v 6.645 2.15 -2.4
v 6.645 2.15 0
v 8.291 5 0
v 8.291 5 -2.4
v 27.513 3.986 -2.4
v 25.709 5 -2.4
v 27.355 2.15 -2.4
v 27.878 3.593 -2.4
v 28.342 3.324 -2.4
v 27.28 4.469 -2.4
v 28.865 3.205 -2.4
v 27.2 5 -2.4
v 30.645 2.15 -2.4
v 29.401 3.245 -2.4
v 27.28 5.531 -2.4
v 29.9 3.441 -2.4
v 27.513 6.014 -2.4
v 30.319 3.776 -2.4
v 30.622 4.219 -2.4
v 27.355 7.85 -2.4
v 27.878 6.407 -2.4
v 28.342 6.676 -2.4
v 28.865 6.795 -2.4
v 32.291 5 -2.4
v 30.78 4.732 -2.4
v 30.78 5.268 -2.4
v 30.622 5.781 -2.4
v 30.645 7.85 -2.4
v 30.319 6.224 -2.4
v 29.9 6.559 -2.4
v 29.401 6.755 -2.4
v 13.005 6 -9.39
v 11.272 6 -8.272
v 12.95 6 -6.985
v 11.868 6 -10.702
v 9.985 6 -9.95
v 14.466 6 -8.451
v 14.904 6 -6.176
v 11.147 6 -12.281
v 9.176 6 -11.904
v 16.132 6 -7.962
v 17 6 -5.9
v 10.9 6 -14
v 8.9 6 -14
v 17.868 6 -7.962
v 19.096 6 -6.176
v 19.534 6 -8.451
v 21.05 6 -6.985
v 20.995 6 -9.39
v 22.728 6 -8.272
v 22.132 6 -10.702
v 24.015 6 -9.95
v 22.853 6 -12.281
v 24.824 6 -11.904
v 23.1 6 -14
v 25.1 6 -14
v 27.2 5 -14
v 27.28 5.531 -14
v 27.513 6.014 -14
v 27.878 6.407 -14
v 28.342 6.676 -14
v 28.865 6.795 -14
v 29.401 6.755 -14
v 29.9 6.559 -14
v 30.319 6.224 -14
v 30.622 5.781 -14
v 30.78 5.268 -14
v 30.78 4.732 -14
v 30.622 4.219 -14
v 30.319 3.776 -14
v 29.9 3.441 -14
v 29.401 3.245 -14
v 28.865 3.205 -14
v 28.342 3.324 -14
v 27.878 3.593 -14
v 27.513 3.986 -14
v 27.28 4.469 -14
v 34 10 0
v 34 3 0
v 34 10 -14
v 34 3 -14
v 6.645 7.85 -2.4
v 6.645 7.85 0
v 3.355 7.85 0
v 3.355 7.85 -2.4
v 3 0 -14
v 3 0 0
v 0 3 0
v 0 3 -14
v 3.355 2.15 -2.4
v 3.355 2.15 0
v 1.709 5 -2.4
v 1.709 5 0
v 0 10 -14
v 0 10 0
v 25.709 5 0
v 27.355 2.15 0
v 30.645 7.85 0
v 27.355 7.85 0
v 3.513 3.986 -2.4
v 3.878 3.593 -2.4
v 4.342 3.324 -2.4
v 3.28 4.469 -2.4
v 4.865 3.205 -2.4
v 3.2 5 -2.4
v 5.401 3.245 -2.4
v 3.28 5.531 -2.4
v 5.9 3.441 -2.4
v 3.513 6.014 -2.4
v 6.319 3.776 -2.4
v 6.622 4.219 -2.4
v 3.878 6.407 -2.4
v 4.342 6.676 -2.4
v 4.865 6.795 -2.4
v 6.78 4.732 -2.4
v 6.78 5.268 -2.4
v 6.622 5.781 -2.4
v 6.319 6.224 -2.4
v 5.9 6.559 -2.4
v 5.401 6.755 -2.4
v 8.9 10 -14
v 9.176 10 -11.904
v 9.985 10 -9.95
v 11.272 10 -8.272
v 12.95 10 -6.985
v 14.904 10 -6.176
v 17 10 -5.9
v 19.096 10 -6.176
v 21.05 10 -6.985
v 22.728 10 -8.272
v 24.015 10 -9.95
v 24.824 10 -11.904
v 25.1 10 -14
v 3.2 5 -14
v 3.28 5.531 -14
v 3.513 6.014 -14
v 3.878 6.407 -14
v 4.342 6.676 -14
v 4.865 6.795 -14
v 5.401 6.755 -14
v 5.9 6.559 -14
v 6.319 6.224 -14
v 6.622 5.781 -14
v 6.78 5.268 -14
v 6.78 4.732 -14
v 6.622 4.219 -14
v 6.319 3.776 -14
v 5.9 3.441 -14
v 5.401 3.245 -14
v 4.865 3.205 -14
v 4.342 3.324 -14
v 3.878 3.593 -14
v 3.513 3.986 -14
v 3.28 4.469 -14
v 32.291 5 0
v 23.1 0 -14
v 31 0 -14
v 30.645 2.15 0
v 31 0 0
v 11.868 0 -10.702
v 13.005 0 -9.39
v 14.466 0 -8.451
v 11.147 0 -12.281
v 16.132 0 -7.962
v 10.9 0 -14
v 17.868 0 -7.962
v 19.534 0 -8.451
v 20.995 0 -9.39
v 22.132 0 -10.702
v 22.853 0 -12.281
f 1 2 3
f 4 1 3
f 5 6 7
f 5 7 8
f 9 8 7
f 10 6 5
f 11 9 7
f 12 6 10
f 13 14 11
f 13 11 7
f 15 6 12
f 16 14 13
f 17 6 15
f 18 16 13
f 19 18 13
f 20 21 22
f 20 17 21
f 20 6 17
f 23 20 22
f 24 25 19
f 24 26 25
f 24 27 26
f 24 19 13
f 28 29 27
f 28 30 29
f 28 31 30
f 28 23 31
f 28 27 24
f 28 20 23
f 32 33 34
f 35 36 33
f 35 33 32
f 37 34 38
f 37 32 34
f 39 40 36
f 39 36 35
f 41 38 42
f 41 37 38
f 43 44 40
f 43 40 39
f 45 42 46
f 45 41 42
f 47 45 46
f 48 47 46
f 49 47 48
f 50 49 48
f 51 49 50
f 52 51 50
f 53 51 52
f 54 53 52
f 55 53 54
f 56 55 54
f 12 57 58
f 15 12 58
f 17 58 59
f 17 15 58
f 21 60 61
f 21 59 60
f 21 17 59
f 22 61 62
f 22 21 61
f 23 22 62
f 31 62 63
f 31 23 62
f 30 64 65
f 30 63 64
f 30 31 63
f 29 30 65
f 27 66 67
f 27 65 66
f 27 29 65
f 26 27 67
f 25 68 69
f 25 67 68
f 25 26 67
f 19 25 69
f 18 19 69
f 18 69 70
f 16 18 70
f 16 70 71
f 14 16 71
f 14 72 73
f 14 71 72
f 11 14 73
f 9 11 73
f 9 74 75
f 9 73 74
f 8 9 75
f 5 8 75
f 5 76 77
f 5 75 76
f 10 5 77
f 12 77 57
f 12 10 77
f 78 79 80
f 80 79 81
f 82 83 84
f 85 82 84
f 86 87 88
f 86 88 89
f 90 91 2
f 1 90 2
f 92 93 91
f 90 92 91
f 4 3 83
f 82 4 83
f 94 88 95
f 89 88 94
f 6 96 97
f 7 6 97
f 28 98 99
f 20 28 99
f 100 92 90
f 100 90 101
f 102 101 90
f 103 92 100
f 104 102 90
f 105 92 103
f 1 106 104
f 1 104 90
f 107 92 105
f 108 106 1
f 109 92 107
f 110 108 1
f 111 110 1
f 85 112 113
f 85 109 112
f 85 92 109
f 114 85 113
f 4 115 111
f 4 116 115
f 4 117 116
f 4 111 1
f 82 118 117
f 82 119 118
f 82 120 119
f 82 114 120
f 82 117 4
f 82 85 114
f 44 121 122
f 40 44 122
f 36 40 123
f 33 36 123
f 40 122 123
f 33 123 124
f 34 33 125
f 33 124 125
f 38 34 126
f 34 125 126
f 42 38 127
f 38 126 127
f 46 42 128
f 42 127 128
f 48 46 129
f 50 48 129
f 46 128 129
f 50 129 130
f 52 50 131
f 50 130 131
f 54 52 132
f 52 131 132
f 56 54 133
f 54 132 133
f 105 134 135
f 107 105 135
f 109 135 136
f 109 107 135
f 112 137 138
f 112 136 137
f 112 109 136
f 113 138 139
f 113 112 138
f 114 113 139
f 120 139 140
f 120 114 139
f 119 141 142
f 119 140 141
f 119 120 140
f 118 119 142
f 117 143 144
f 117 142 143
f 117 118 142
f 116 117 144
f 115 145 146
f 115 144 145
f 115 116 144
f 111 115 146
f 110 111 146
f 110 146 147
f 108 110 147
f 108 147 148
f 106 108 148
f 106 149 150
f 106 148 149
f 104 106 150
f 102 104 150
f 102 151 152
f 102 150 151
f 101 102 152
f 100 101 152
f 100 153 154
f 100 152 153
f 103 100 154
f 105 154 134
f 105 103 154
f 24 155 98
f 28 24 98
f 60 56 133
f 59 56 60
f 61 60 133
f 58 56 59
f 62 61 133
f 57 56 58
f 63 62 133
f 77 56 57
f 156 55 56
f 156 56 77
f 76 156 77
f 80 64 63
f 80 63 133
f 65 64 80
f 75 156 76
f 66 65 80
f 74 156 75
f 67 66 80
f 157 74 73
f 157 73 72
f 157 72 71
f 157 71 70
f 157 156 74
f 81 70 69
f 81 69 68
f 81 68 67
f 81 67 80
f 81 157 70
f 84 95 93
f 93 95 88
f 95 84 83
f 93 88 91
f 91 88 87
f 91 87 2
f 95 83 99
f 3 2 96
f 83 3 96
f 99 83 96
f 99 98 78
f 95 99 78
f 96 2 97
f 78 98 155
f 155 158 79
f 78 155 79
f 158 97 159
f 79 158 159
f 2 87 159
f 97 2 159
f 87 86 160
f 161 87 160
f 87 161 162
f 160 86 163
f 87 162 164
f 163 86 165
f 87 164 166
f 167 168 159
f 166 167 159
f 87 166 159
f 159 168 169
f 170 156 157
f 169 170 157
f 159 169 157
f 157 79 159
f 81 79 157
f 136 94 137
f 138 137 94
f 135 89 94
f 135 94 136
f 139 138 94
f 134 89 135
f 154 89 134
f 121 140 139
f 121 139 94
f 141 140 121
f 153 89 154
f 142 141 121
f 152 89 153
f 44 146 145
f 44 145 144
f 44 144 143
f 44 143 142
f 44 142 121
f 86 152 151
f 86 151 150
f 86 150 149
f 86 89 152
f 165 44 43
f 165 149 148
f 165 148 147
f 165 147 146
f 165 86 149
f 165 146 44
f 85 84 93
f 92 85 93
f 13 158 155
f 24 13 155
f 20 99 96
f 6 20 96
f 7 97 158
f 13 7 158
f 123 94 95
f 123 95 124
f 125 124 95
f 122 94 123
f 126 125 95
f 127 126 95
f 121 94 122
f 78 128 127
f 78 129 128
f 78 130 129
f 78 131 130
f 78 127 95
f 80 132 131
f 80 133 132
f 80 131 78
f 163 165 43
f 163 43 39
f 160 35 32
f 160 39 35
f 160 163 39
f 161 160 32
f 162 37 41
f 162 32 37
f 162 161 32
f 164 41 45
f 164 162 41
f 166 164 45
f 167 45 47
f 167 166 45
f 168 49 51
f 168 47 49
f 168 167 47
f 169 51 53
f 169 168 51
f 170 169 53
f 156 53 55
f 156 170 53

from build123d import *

# Parameters (mm, degrees)
SKETCH1_W               = 34
SKETCH1_H               = 14
BOSS_EXTRUDE1_DEPTH     = 10
SKETCH2_R               = 8.1
CUT_EXTRUDE1_DEPTH      = 4
CUT_EXTRUDE2_DEPTH      = 39.105117767
CUT_EXTRUDE2_DEPTH_BACK = 39.105117767
SKETCH4_R               = 6.1
CUT_EXTRUDE3_DEPTH      = 39.105117767
CUT_EXTRUDE3_DEPTH_BACK = 39.105117767
SKETCH5_R               = 1.8
CUT_EXTRUDE4_DEPTH      = 2.4
CHAMFER1_SIZE           = 3


with BuildPart() as part:
    # Sketch1 → Boss-Extrude1 (new body)
    with BuildSketch(Plane(origin=(0, 0, 0), x_dir=(1, 0, 0), z_dir=(0, 1, 0))):
        with Locations((17, 7)):
            Rectangle(SKETCH1_W, SKETCH1_H)
    extrude(amount=BOSS_EXTRUDE1_DEPTH)

    # Sketch2 → Cut-Extrude1 (cut)
    with BuildSketch(Plane(origin=(0, 10, 0), x_dir=(1, 0, 0), z_dir=(0, 1, 0))):
        with Locations((17, 14)):
            Circle(SKETCH2_R)
    extrude(amount=-CUT_EXTRUDE1_DEPTH, mode=Mode.SUBTRACT)

    # Sketch4 → Cut-Extrude2 (cut, two sides: drawn at the far end of the back side and taken through both)
    with BuildSketch(Plane(origin=(0, 10, 0), x_dir=(1, 0, 0), z_dir=(0, 1, 0)).offset(-CUT_EXTRUDE2_DEPTH_BACK)):
        with Locations((17, 14)):
            Circle(SKETCH4_R)
    extrude(amount=CUT_EXTRUDE2_DEPTH + CUT_EXTRUDE2_DEPTH_BACK, mode=Mode.SUBTRACT)

    # Sketch5 → Cut-Extrude3 (cut, two sides: drawn at the far end of the back side and taken through both)
    with BuildSketch(Plane(origin=(0, 0, -14), x_dir=(-1, 0, 0), z_dir=(0, 0, -1)).offset(-CUT_EXTRUDE3_DEPTH_BACK)):
        with Locations((-29, 5)):
            Circle(SKETCH5_R)
        with Locations((-5, 5)):
            Circle(SKETCH5_R)
    extrude(amount=CUT_EXTRUDE3_DEPTH + CUT_EXTRUDE3_DEPTH_BACK, mode=Mode.SUBTRACT)

    # Sketch6 → Cut-Extrude4 (cut)
    with BuildSketch(Plane.XY):
        Polygon((8.290896534, 5), (6.645448267, 7.85), (3.354551733, 7.85), (1.709103466, 5), (3.354551733, 2.15), (6.645448267, 2.15), align=None)
        Polygon((25.709103466, 5), (27.354551733, 2.15), (30.645448267, 2.15), (32.290896534, 5), (30.645448267, 7.85), (27.354551733, 7.85), align=None)
    extrude(amount=-CUT_EXTRUDE4_DEPTH, mode=Mode.SUBTRACT)

    # Chamfer1
    chamfer1_edges = [part.edges().sort_by_distance(p)[0] for p in [
        (34, 0, -7),
        (0, 0, -7),
    ]]
    chamfer(chamfer1_edges, length=CHAMFER1_SIZE)


solid = part.part
